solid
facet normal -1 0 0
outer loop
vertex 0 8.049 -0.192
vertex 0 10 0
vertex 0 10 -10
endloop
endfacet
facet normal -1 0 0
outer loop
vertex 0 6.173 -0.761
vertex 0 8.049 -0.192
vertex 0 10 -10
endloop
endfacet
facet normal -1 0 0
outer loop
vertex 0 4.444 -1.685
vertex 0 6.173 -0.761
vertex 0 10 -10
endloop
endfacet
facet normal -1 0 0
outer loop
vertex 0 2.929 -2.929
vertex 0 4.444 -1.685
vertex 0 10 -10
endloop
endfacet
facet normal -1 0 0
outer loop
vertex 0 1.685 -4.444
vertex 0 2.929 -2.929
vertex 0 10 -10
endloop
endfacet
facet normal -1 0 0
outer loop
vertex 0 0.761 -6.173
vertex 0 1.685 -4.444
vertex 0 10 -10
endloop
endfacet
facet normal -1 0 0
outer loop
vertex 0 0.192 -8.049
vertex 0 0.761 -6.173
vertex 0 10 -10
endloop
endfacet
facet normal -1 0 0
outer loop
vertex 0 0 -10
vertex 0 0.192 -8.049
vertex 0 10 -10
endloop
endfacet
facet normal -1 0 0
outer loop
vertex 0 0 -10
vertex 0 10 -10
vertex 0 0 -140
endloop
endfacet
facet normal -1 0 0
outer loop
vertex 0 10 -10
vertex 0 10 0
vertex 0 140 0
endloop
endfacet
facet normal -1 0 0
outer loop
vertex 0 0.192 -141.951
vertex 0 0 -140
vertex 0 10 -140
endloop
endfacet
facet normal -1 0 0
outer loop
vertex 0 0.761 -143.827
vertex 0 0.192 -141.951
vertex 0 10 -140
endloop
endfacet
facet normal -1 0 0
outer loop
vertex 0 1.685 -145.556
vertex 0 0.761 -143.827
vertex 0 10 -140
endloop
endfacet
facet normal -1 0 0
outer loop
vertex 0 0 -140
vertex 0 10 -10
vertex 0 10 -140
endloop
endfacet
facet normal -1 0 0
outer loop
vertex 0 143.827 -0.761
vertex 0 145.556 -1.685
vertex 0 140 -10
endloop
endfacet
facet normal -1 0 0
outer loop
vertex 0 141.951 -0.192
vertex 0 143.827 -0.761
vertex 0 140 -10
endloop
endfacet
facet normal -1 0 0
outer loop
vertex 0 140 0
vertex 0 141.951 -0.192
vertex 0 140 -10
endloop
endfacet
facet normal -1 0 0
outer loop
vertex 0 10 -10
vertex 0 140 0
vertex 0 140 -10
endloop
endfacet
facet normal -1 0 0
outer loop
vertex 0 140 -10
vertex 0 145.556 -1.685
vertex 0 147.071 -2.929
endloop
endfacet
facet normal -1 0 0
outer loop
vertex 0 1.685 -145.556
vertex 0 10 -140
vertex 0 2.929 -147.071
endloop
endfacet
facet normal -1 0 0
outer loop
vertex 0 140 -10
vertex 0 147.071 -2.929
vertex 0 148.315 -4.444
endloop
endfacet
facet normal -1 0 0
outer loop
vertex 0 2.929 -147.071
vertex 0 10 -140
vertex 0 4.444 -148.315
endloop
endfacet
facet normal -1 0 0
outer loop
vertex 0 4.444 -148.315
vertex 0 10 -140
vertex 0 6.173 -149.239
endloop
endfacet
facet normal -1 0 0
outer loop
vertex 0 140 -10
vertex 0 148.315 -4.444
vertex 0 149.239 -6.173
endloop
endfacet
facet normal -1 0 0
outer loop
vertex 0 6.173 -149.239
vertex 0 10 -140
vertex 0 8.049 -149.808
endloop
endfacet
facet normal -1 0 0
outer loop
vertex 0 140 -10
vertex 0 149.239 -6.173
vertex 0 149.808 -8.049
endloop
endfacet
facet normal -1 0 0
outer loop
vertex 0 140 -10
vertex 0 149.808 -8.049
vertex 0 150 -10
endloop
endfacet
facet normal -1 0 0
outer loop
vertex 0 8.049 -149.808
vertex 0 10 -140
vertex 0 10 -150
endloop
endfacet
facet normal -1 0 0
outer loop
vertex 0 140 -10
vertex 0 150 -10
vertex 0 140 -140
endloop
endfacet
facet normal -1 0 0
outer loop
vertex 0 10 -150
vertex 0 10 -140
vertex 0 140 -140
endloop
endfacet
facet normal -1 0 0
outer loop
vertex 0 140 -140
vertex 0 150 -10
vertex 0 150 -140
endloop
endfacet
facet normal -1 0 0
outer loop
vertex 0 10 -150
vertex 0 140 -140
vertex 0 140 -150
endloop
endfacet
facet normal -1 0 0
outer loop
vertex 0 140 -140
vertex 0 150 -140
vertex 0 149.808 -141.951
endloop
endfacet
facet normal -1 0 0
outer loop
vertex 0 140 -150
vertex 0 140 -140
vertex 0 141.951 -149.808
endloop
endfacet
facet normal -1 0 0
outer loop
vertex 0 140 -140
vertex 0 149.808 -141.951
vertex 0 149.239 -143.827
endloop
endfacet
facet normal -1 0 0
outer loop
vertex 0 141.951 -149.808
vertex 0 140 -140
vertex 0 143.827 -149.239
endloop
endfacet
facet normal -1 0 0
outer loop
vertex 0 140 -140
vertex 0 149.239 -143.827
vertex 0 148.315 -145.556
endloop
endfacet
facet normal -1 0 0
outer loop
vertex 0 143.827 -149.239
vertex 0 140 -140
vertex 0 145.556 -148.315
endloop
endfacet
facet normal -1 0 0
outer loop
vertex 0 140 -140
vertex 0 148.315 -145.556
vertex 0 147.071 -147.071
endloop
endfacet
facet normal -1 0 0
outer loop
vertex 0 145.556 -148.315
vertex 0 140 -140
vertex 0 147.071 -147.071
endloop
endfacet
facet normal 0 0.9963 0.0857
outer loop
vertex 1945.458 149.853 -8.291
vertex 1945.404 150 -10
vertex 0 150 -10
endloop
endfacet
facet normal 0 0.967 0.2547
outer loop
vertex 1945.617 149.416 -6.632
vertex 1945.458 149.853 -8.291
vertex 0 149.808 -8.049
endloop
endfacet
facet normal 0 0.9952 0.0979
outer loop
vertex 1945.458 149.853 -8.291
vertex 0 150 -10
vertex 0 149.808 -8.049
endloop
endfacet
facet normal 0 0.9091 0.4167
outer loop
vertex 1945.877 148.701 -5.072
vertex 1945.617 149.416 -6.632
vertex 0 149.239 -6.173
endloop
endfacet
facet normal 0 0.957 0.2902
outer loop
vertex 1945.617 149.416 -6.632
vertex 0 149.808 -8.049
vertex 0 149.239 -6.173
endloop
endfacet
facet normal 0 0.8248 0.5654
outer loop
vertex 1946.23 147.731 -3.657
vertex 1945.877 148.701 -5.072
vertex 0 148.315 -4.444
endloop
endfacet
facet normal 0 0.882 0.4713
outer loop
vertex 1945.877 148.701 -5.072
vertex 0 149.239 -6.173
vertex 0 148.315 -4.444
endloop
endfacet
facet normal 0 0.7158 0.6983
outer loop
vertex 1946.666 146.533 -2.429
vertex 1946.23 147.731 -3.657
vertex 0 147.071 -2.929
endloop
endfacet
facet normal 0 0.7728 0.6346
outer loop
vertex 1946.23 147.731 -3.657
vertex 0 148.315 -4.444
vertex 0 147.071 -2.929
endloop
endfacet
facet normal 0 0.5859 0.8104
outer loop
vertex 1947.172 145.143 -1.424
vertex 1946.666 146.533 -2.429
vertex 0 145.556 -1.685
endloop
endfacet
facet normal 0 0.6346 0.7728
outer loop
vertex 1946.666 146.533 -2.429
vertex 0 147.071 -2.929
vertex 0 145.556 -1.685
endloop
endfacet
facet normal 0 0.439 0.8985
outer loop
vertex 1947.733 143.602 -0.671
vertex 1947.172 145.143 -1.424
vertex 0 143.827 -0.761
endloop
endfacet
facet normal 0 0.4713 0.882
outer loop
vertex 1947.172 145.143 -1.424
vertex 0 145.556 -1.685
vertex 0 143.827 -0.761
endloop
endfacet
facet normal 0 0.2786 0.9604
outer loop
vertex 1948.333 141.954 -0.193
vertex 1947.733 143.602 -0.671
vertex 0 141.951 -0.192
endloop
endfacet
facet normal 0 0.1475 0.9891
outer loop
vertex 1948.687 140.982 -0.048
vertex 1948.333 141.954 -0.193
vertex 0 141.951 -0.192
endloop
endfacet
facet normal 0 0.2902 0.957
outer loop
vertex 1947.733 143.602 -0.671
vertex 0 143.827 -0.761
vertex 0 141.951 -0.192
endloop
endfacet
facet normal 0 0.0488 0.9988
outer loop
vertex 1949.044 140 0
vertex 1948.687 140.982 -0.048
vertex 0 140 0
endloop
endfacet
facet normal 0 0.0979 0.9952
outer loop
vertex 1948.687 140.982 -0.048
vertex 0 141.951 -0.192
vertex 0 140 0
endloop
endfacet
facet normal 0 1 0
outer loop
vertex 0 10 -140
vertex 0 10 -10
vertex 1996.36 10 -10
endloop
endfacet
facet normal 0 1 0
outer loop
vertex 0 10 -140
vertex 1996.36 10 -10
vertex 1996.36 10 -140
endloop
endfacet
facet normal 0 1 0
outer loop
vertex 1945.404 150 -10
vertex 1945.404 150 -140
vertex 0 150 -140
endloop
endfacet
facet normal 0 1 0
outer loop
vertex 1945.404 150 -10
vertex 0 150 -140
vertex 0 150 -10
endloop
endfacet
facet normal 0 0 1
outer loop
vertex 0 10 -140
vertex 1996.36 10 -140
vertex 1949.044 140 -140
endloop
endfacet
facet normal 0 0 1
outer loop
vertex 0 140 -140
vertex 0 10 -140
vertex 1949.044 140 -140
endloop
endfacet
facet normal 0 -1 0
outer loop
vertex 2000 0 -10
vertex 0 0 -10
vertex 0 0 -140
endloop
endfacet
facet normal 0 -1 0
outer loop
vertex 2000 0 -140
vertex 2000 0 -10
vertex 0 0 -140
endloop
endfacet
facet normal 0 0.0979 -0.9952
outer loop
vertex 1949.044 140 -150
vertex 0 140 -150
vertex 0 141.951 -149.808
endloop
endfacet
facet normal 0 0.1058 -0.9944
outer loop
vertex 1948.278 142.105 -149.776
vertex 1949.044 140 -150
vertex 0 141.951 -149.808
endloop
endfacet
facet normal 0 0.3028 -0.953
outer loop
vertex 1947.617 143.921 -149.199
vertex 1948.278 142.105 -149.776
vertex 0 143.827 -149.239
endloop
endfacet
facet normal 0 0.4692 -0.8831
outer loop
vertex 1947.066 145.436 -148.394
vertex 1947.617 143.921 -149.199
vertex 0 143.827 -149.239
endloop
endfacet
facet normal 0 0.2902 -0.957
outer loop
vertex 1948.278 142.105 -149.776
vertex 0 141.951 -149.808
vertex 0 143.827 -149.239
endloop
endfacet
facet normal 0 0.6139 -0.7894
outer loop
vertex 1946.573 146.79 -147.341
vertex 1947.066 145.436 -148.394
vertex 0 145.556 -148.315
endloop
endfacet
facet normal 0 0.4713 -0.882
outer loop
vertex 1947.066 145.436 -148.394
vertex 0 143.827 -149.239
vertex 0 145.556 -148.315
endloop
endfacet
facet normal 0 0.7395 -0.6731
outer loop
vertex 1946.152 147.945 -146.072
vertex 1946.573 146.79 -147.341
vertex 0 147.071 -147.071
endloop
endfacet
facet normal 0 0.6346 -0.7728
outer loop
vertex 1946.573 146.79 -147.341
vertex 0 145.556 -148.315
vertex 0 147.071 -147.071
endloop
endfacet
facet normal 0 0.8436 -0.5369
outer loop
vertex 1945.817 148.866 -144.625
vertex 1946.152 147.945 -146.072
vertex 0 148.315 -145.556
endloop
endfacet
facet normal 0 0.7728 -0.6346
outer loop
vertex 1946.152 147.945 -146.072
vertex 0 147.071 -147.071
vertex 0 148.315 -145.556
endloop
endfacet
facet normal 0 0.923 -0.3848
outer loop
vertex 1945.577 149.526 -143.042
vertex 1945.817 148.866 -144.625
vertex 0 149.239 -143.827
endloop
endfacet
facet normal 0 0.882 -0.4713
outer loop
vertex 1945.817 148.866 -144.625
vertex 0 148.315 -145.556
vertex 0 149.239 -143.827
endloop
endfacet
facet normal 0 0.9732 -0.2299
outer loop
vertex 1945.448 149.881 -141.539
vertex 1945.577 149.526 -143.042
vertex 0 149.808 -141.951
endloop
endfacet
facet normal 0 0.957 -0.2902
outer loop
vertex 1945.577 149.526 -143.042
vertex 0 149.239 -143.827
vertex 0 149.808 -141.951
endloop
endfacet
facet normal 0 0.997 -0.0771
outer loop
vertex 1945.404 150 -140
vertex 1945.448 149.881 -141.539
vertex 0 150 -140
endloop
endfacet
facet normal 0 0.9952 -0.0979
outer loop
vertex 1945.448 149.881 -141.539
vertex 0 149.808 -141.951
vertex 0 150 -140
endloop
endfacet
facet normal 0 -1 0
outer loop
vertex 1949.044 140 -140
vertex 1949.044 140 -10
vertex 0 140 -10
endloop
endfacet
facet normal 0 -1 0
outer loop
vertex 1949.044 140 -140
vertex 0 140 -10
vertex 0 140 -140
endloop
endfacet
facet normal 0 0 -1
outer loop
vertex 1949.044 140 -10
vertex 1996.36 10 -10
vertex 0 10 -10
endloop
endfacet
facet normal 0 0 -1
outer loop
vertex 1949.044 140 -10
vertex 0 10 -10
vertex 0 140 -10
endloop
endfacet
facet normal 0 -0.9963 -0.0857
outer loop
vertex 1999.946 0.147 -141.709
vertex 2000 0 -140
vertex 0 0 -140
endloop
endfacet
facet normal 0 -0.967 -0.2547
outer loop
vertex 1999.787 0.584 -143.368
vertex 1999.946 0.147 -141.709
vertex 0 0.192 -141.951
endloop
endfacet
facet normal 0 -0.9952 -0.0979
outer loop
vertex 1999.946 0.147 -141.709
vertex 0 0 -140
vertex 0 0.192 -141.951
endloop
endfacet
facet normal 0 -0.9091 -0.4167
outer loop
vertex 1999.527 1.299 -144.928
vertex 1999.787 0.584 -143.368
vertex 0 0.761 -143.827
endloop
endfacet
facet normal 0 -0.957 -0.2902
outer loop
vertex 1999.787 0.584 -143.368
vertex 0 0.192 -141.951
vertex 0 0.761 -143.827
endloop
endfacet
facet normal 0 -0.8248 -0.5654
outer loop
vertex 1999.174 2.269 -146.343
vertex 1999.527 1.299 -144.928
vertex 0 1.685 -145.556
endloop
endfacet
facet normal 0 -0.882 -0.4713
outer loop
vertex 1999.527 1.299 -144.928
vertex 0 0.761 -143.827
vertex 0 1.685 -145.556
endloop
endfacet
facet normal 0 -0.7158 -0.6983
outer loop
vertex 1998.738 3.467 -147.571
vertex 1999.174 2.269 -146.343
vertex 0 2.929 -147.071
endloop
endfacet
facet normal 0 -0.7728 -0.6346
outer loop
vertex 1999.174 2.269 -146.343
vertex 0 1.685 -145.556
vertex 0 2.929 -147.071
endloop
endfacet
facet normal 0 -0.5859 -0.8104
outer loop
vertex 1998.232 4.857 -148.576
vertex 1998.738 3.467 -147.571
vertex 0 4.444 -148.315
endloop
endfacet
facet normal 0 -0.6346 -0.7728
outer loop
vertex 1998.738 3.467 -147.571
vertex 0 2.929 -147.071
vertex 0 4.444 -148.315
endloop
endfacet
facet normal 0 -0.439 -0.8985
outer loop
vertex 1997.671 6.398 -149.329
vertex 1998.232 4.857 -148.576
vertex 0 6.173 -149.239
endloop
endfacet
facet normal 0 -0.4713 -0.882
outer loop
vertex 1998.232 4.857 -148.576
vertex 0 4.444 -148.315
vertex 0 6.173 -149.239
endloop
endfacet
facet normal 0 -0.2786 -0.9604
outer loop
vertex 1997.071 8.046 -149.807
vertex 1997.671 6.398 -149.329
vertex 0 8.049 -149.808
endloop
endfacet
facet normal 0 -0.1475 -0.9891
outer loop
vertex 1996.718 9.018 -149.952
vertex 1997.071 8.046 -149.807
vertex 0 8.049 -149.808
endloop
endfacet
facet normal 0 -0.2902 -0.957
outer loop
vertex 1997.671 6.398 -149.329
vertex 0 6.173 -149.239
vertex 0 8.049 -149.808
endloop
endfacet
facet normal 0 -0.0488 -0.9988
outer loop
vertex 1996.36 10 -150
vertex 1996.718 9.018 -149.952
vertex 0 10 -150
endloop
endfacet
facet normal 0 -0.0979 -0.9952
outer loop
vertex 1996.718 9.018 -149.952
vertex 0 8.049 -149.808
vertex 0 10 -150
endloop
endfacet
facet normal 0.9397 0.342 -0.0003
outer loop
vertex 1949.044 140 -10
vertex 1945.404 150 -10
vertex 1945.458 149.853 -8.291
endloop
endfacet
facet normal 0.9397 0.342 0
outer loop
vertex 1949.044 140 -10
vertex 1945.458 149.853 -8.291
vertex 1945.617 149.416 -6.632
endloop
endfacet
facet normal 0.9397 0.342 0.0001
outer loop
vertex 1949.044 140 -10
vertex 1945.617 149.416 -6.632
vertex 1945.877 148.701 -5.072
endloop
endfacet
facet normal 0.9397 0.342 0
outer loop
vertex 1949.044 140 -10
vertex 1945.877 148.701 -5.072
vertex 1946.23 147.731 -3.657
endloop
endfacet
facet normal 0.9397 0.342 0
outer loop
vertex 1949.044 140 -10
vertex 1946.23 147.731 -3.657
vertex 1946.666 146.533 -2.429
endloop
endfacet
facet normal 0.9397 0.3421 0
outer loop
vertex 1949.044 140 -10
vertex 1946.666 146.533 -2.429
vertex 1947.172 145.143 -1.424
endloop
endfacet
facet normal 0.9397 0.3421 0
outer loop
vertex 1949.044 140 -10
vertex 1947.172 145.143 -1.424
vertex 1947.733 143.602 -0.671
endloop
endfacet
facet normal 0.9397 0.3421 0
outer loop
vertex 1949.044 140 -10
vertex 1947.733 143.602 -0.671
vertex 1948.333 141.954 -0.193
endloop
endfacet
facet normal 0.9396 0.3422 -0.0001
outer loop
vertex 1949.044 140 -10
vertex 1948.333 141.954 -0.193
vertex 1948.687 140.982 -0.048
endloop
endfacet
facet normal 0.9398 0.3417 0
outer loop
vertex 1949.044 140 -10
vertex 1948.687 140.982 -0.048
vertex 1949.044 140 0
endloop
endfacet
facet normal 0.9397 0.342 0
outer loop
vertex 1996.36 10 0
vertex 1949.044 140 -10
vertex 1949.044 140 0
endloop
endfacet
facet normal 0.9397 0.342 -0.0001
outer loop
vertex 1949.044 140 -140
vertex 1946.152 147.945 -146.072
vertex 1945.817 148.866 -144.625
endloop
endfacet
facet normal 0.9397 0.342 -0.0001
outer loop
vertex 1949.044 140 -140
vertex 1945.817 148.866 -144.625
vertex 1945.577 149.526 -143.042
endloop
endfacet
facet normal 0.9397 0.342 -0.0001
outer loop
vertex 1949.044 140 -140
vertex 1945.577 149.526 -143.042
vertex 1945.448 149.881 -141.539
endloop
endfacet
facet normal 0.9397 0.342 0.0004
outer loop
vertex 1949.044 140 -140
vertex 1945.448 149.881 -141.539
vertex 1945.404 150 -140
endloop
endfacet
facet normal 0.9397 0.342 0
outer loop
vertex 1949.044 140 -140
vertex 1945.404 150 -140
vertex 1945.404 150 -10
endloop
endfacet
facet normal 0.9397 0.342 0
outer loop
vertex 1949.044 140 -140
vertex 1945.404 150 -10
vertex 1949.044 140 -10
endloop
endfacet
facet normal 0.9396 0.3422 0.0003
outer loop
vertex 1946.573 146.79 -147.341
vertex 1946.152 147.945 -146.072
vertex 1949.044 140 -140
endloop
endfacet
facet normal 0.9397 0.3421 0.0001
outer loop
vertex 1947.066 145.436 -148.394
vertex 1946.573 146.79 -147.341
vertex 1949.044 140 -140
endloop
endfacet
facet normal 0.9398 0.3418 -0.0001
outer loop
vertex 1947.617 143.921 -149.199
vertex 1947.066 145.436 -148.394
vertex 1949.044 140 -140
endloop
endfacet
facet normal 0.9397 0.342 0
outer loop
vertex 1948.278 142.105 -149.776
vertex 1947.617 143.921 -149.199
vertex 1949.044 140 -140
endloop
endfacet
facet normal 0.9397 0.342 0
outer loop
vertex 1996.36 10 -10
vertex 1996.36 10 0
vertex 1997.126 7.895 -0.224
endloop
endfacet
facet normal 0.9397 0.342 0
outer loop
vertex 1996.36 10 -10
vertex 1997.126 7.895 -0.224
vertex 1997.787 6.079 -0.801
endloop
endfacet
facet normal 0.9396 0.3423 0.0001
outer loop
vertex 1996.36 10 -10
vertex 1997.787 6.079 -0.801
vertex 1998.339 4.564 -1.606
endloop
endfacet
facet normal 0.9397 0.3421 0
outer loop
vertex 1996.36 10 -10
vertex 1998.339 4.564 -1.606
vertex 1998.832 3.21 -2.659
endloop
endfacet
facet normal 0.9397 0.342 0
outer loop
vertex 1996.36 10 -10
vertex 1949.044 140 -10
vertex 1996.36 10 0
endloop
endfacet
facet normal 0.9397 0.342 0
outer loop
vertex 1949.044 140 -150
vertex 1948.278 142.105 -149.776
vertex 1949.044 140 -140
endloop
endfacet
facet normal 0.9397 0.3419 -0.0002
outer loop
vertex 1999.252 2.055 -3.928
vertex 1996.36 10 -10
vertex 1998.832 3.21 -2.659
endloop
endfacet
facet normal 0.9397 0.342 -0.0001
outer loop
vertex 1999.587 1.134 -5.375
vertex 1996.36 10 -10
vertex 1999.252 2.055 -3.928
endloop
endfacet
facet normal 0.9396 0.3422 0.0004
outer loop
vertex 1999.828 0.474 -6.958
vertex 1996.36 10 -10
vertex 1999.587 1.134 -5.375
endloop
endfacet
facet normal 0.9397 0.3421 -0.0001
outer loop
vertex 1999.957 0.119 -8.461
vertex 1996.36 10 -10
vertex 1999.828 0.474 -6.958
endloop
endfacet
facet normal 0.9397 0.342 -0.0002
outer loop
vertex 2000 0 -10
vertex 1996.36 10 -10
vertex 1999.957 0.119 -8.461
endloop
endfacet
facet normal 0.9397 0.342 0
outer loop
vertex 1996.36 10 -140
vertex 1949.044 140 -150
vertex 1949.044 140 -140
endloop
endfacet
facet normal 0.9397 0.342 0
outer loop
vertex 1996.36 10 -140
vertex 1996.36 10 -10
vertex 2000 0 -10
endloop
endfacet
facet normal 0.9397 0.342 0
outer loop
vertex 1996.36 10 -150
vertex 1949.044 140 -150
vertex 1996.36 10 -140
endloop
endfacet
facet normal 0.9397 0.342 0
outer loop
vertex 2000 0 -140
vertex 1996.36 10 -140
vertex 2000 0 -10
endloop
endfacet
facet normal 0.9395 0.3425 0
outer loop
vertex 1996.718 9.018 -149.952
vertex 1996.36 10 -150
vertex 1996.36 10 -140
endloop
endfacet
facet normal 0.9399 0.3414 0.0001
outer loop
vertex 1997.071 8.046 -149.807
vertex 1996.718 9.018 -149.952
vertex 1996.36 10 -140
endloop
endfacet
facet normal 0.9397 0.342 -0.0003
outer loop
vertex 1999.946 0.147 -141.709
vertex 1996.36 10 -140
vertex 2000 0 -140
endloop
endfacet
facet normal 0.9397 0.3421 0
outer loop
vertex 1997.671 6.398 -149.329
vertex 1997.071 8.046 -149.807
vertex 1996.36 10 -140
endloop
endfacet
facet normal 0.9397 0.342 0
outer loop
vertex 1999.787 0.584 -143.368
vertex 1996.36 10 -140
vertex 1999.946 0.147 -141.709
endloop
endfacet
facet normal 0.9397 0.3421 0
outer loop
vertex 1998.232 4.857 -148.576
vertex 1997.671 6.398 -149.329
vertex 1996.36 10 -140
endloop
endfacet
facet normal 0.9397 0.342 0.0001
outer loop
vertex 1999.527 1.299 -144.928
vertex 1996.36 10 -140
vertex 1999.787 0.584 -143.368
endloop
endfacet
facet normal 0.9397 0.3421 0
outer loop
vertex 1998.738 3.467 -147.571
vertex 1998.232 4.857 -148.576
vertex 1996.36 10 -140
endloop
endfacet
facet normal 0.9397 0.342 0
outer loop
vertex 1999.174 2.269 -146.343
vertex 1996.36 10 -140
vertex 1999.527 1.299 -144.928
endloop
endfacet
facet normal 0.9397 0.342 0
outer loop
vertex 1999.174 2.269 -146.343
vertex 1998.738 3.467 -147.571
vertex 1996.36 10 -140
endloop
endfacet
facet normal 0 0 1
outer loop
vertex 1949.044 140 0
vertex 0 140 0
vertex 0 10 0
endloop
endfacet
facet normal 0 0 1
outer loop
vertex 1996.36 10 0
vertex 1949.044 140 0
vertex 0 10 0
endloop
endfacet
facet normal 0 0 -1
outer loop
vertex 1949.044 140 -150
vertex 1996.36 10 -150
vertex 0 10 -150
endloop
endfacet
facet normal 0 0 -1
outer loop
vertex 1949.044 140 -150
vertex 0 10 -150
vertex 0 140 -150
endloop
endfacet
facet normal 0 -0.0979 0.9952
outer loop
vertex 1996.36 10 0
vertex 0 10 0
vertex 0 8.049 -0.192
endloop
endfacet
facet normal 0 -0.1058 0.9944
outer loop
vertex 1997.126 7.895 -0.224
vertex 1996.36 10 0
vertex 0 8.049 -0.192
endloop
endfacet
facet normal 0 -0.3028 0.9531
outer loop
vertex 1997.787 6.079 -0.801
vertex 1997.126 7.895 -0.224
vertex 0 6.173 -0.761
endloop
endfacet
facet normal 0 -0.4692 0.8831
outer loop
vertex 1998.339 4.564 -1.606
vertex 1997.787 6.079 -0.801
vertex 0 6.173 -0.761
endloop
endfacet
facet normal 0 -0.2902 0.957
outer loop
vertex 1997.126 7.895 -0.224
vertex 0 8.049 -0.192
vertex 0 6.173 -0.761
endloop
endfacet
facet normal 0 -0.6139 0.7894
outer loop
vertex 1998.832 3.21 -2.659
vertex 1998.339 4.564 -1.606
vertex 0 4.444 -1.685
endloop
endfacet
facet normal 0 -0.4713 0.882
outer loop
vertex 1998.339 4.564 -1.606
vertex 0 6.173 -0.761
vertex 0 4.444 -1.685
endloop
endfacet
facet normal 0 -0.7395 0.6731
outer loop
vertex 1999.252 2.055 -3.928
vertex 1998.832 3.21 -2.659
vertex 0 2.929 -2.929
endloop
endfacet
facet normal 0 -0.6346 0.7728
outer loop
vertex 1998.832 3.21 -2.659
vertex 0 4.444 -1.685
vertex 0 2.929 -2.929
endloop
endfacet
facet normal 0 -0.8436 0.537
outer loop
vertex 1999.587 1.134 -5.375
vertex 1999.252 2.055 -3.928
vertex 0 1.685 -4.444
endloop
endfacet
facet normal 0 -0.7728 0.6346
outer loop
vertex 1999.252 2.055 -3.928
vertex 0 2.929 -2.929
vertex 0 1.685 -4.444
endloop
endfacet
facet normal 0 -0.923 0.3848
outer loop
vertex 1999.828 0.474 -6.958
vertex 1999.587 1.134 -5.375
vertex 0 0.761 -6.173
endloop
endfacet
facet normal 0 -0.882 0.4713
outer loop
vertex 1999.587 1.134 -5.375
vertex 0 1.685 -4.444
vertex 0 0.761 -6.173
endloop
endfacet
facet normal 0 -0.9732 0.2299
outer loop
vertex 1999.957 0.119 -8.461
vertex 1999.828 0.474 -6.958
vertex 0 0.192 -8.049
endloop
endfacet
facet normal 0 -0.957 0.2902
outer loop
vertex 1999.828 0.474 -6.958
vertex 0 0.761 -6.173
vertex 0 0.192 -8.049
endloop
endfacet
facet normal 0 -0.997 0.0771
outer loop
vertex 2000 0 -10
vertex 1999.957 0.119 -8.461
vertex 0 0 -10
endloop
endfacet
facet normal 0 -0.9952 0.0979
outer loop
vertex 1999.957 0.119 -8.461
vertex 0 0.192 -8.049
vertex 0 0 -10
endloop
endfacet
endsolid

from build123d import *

# Parameters (mm, degrees)
SKETCH1_W               = 130
SKETCH1_H               = 130
EXTRUDE1_DEPTH          = 2000
CUT_EXTRUDE2_DEPTH      = 2012.218536112
CUT_EXTRUDE2_DEPTH_BACK = 2012.218536112


with BuildPart() as part:
    # Sketch1 → Extrude1 (new body)
    with BuildSketch(Plane(origin=(0, 0, 0), x_dir=(0, 0, -1), z_dir=(1, 0, 0))):
        with BuildLine():
            Line((10, 0), (140, 0))
            ThreePointArc((140, 0), (147.071067812, 2.928932188), (150, 10))
            Line((150, 10), (150, 140))
            ThreePointArc((150, 140), (147.071067812, 147.071067812), (140, 150))
            Line((140, 150), (10, 150))
            ThreePointArc((10, 150), (2.928932188, 147.071067812), (0, 140))
            Line((0, 140), (0, 10))
            ThreePointArc((0, 10), (2.928932188, 2.928932188), (10, 0))
        make_face()
        with Locations((75, 75)):
            Rectangle(SKETCH1_W, SKETCH1_H, mode=Mode.SUBTRACT)
    extrude(amount=EXTRUDE1_DEPTH)

    # Sketch2 → Cut-Extrude2 (cut, two sides: drawn at the far end of the back side and taken through both)
    with BuildSketch(Plane.XY.offset(-CUT_EXTRUDE2_DEPTH_BACK)):
        Polygon((3375.343105648, -3778.724126769), (2000, 0), (1945.40446486, 150), (570.061359213, 3928.724126769), (8127.509612751, 6679.410338064), (10932.791359186, -1028.037915474), align=None)
    extrude(amount=CUT_EXTRUDE2_DEPTH + CUT_EXTRUDE2_DEPTH_BACK, mode=Mode.SUBTRACT)


solid = part.part
